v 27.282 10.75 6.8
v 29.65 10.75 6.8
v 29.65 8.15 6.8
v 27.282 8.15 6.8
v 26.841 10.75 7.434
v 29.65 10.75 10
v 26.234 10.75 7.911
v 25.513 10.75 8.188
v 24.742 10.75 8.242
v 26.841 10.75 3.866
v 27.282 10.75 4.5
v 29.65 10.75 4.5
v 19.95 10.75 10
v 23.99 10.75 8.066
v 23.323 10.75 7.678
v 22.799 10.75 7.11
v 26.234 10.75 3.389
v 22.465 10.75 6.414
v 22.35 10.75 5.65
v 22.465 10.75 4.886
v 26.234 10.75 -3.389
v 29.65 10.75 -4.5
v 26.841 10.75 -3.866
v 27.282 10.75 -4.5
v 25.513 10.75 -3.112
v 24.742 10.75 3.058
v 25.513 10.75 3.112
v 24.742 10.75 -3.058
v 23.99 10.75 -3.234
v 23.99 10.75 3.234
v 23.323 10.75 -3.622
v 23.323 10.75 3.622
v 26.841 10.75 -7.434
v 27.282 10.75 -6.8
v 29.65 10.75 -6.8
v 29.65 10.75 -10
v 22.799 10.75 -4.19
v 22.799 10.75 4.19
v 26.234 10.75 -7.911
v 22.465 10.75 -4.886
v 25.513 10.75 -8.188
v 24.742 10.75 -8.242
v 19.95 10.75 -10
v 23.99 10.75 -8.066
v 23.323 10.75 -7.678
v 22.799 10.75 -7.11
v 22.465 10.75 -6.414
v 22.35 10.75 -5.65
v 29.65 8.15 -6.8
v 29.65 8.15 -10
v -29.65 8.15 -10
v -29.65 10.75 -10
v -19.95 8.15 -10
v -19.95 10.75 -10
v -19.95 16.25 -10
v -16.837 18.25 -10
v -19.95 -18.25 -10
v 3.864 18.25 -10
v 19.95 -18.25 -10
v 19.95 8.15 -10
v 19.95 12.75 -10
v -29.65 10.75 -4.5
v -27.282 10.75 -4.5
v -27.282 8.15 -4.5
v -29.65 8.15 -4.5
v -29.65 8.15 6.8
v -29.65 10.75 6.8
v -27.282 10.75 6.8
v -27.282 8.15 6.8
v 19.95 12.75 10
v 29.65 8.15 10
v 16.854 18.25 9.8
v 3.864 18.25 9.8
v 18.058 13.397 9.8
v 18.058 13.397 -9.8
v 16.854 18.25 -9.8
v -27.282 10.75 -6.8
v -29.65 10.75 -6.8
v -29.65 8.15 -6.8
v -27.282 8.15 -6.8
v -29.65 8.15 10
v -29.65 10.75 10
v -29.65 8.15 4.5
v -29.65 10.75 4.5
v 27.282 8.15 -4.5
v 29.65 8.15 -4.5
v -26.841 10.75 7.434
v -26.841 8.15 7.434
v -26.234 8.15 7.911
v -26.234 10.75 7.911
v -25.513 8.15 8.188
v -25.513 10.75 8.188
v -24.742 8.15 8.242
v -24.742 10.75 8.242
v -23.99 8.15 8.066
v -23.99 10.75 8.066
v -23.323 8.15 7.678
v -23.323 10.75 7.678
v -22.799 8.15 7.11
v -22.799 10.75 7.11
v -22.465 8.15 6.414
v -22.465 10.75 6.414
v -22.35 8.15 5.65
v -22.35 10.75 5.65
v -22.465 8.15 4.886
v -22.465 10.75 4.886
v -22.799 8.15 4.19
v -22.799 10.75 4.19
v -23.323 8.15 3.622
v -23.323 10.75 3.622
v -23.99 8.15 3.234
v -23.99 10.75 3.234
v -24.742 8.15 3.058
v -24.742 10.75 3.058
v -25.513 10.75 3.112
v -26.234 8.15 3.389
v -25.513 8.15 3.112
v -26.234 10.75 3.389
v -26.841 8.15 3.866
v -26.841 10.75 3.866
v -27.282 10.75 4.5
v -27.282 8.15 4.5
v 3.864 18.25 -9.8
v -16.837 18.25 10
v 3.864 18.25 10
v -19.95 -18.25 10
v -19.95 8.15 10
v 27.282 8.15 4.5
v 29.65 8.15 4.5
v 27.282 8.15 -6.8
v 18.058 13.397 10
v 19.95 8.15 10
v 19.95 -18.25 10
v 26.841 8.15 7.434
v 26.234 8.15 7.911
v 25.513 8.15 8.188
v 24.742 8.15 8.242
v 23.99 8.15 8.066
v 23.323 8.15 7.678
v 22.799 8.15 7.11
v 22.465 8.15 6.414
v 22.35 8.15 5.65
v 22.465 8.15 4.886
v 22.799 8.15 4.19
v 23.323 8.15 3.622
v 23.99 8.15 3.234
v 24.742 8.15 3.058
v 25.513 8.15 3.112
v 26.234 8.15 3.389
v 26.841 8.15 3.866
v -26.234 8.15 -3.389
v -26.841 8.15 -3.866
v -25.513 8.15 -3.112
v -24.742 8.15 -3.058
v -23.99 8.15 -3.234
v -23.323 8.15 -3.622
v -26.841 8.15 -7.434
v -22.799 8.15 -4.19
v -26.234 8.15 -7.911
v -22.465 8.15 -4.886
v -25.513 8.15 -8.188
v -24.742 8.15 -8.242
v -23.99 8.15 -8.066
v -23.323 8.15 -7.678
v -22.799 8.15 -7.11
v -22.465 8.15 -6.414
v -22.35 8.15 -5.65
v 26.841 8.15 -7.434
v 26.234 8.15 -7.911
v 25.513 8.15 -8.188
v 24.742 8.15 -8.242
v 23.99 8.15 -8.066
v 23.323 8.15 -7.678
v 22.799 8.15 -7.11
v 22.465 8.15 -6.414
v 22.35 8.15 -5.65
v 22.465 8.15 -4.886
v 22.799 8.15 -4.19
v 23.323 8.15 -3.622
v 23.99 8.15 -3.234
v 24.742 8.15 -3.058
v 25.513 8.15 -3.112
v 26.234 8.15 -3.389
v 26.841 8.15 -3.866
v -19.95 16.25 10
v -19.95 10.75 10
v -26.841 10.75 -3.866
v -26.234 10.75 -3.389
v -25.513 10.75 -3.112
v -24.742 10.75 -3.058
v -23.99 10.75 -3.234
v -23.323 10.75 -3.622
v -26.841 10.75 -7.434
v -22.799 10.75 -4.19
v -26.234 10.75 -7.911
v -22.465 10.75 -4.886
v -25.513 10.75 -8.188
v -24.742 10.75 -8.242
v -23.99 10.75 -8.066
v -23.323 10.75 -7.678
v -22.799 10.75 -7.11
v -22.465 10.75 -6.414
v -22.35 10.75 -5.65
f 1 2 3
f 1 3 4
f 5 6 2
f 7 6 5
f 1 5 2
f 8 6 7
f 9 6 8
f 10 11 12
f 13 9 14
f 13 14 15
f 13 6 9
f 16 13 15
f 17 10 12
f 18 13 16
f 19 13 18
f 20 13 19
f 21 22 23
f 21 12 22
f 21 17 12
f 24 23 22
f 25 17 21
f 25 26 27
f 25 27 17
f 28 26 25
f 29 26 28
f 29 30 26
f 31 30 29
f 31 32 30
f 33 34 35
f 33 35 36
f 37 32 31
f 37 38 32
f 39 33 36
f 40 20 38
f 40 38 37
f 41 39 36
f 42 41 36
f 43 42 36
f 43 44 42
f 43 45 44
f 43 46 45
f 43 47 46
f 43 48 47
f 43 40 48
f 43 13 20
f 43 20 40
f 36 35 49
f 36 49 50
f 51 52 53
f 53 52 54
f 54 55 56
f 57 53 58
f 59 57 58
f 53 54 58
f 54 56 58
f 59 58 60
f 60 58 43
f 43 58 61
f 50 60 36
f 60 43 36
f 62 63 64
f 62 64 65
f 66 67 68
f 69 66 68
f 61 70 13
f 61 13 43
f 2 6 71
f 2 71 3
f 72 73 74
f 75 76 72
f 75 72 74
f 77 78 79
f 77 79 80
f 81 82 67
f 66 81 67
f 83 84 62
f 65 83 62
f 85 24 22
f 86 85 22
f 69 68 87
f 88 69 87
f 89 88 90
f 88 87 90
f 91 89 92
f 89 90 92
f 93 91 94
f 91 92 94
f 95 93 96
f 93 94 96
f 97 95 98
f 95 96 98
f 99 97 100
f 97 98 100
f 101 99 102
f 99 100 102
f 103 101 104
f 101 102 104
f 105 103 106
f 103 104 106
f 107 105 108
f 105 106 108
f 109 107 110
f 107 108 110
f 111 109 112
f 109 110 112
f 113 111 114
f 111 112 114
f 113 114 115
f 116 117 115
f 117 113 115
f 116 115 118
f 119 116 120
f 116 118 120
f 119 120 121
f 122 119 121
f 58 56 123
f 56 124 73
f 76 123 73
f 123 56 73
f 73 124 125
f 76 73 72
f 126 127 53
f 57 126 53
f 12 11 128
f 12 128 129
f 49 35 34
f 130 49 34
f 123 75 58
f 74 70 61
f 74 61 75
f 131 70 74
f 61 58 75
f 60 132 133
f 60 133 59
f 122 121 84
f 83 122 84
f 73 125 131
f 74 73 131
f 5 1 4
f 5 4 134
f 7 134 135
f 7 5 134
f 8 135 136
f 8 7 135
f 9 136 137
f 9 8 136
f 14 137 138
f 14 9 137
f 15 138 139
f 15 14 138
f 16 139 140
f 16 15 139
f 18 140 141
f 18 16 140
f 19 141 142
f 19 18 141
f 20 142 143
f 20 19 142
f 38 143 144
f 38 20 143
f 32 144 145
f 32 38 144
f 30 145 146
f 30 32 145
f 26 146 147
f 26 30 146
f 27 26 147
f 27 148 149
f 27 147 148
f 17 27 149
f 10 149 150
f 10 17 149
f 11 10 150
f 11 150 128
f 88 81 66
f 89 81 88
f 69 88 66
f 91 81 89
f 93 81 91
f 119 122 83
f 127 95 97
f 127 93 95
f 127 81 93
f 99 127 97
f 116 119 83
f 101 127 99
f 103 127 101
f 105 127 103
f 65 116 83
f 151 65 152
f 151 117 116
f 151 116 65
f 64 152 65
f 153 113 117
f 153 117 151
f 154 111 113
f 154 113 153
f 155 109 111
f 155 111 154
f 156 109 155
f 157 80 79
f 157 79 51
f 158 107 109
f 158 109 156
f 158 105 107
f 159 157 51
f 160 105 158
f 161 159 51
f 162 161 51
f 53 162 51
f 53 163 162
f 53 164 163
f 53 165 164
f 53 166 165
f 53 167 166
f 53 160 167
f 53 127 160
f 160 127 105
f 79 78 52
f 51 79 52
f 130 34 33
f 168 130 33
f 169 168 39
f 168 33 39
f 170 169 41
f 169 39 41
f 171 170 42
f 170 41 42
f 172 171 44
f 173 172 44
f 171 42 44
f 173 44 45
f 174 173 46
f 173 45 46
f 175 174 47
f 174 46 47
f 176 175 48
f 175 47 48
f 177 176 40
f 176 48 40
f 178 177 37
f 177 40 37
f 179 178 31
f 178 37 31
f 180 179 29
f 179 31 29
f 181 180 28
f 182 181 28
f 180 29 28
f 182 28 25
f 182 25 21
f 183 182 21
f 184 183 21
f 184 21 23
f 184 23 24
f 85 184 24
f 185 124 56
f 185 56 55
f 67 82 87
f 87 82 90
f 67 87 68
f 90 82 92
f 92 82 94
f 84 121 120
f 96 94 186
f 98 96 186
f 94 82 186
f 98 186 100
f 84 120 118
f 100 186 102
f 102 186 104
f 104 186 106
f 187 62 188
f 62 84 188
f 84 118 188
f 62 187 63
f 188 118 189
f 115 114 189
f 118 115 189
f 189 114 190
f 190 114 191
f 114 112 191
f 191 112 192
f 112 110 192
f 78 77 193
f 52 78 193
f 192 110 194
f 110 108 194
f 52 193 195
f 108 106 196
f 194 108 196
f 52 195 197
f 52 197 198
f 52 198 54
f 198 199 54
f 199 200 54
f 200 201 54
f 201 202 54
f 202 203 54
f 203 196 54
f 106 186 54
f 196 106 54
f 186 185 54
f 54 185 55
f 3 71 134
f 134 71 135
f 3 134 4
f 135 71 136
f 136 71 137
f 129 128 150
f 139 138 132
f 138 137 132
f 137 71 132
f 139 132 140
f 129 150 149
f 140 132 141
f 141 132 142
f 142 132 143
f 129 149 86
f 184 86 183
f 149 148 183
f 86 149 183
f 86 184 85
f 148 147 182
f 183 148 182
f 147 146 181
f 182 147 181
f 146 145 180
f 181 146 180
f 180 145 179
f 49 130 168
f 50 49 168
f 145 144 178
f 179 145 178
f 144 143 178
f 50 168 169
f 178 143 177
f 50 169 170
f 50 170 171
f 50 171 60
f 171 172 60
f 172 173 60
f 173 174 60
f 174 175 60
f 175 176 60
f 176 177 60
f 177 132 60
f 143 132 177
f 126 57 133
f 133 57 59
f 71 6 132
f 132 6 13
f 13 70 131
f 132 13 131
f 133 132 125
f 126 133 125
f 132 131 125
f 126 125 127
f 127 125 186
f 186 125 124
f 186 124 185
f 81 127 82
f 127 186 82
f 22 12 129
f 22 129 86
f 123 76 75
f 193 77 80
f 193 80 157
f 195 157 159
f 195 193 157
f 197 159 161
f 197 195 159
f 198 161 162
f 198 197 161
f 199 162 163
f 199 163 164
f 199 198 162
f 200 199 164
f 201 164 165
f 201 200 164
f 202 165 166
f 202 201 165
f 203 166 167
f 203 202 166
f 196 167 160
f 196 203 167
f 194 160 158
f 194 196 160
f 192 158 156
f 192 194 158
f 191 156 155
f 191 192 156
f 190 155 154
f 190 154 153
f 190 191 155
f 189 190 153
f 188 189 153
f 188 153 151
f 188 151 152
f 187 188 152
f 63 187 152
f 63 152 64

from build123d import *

# Parameters (mm, degrees)
SKETCH1_W           = 39.9
SKETCH1_H           = 20
BOSS_EXTRUDE1_DEPTH = 18.25
SKETCH2_W           = 20
SKETCH2_H           = 2.6
BOSS_EXTRUDE2_DEPTH = 9.7
CUT_EXTRUDE1_DEPTH  = 41.15202361
BOSS_EXTRUDE3_DEPTH = 19.8
CUT_EXTRUDE2_REACH  = 44.663
CUT_EXTRUDE4_DEPTH  = 0.2
CUT_EXTRUDE5_REACH  = 42.152


with BuildPart() as part:
    # Sketch1 → Boss-Extrude1 (new, symmetric)
    with BuildSketch(Plane(origin=(0, 0, 0), x_dir=(1, 0, 0), z_dir=(0, 1, 0))):
        Rectangle(SKETCH1_W, SKETCH1_H)
    extrude(amount=BOSS_EXTRUDE1_DEPTH, both=True)

    # Sketch2 → Boss-Extrude2 (add)
    with BuildSketch(Plane(origin=(19.95, 0, 0), x_dir=(0, 0, -1), z_dir=(1, 0, 0))):
        with Locations((0, 9.45)):
            Rectangle(SKETCH2_W, SKETCH2_H)
    boss_extrude2 = extrude(amount=BOSS_EXTRUDE2_DEPTH)

    # Sketch3 → Cut-Extrude1 (cut, through all)
    with BuildSketch(Plane.XY.offset(10)):
        Polygon((19.95, 12.75), (3.864292058, 18.25), (19.95, 18.25), align=None)
    extrude(amount=-CUT_EXTRUDE1_DEPTH, mode=Mode.SUBTRACT)

    # Sketch5 → Boss-Extrude3 (add)
    with BuildSketch(Plane.XY.offset(10)):
        Polygon((3.864292058, 18.25), (16.853835423, 18.25), (18.057563772, 13.397058824), align=None)
    extrude(amount=-BOSS_EXTRUDE3_DEPTH)

    # Sketch7 → Cut-Extrude2 (cut, up to next)
    with BuildSketch(Plane(origin=(0, 10.75, 0), x_dir=(1, 0, 0), z_dir=(0, 1, 0)), mode=Mode.PRIVATE) as cut_extrude2_sk1:
        with BuildLine():
            Line((29.65, 6.8), (27.281844763, 6.8))
            ThreePointArc((27.281844763, 6.8), (22.35, 5.65), (27.281844763, 4.5))
            Line((27.281844763, 4.5), (29.65, 4.5))
            Line((29.65, 4.5), (29.65, 6.8))
        make_face()
    cut_extrude2_tool1 = extrude(cut_extrude2_sk1.sketch, amount=-CUT_EXTRUDE2_REACH, mode=Mode.PRIVATE) & part.part
    # Sketch7 → Cut-Extrude2 (cut, up to next)
    with BuildSketch(Plane(origin=(0, 10.75, 0), x_dir=(1, 0, 0), z_dir=(0, 1, 0)), mode=Mode.PRIVATE) as cut_extrude2_sk2:
        with BuildLine():
            Line((29.65, -6.8), (27.281844763, -6.8))
            ThreePointArc((27.281844763, -6.8), (22.35, -5.65), (27.281844763, -4.5))
            Line((27.281844763, -4.5), (29.65, -4.5))
            Line((29.65, -4.5), (29.65, -6.8))
        make_face()
    cut_extrude2_tool2 = extrude(cut_extrude2_sk2.sketch, amount=-CUT_EXTRUDE2_REACH, mode=Mode.PRIVATE) & part.part
    cut_extrude2_1 = cut_extrude2_tool1.solids().sort_by_distance((25.640431, 10.75, -5.65))[0]
    add(cut_extrude2_1, mode=Mode.SUBTRACT)
    cut_extrude2_2 = cut_extrude2_tool2.solids().sort_by_distance((25.640431, 10.75, 5.65))[0]
    add(cut_extrude2_2, mode=Mode.SUBTRACT)
    cut_extrude2 = cut_extrude2_1 + cut_extrude2_2  # Cut-Extrude2 as one shape, for the pattern or mirror that repeats it

    # Sketch9 → Cut-Extrude4 (cut)
    with BuildSketch(Plane.XY.offset(10)):
        Polygon((16.853835423, 18.25), (3.864292058, 18.25), (18.057563772, 13.397058824), align=None)
    extrude(amount=-CUT_EXTRUDE4_DEPTH, mode=Mode.SUBTRACT)

    # Sketch10 → Cut-Extrude5 (cut, up to next)
    with BuildSketch(Plane(origin=(0, 0, -10), x_dir=(-1, 0, 0), z_dir=(0, 0, -1)), mode=Mode.PRIVATE) as cut_extrude5_sk1:
        Polygon((16.837123517, 18.25), (19.95, 16.25), (19.95, 18.25), align=None)
    cut_extrude5_tool1 = extrude(cut_extrude5_sk1.sketch, amount=-CUT_EXTRUDE5_REACH, mode=Mode.PRIVATE) & part.part
    add(cut_extrude5_tool1.solids().sort_by_distance((-18.912375, 17.583333, -10))[0], mode=Mode.SUBTRACT)

    # Mirror1: Boss-Extrude2, Cut-Extrude2 across plane
    add(boss_extrude2.mirror(Plane(origin=(0, 0, 0), x_dir=(0, 0, 1), z_dir=(1, 0, 0))))
    add(cut_extrude2.mirror(Plane(origin=(0, 0, 0), x_dir=(0, 0, 1), z_dir=(1, 0, 0))), mode=Mode.SUBTRACT)


solid = part.part
